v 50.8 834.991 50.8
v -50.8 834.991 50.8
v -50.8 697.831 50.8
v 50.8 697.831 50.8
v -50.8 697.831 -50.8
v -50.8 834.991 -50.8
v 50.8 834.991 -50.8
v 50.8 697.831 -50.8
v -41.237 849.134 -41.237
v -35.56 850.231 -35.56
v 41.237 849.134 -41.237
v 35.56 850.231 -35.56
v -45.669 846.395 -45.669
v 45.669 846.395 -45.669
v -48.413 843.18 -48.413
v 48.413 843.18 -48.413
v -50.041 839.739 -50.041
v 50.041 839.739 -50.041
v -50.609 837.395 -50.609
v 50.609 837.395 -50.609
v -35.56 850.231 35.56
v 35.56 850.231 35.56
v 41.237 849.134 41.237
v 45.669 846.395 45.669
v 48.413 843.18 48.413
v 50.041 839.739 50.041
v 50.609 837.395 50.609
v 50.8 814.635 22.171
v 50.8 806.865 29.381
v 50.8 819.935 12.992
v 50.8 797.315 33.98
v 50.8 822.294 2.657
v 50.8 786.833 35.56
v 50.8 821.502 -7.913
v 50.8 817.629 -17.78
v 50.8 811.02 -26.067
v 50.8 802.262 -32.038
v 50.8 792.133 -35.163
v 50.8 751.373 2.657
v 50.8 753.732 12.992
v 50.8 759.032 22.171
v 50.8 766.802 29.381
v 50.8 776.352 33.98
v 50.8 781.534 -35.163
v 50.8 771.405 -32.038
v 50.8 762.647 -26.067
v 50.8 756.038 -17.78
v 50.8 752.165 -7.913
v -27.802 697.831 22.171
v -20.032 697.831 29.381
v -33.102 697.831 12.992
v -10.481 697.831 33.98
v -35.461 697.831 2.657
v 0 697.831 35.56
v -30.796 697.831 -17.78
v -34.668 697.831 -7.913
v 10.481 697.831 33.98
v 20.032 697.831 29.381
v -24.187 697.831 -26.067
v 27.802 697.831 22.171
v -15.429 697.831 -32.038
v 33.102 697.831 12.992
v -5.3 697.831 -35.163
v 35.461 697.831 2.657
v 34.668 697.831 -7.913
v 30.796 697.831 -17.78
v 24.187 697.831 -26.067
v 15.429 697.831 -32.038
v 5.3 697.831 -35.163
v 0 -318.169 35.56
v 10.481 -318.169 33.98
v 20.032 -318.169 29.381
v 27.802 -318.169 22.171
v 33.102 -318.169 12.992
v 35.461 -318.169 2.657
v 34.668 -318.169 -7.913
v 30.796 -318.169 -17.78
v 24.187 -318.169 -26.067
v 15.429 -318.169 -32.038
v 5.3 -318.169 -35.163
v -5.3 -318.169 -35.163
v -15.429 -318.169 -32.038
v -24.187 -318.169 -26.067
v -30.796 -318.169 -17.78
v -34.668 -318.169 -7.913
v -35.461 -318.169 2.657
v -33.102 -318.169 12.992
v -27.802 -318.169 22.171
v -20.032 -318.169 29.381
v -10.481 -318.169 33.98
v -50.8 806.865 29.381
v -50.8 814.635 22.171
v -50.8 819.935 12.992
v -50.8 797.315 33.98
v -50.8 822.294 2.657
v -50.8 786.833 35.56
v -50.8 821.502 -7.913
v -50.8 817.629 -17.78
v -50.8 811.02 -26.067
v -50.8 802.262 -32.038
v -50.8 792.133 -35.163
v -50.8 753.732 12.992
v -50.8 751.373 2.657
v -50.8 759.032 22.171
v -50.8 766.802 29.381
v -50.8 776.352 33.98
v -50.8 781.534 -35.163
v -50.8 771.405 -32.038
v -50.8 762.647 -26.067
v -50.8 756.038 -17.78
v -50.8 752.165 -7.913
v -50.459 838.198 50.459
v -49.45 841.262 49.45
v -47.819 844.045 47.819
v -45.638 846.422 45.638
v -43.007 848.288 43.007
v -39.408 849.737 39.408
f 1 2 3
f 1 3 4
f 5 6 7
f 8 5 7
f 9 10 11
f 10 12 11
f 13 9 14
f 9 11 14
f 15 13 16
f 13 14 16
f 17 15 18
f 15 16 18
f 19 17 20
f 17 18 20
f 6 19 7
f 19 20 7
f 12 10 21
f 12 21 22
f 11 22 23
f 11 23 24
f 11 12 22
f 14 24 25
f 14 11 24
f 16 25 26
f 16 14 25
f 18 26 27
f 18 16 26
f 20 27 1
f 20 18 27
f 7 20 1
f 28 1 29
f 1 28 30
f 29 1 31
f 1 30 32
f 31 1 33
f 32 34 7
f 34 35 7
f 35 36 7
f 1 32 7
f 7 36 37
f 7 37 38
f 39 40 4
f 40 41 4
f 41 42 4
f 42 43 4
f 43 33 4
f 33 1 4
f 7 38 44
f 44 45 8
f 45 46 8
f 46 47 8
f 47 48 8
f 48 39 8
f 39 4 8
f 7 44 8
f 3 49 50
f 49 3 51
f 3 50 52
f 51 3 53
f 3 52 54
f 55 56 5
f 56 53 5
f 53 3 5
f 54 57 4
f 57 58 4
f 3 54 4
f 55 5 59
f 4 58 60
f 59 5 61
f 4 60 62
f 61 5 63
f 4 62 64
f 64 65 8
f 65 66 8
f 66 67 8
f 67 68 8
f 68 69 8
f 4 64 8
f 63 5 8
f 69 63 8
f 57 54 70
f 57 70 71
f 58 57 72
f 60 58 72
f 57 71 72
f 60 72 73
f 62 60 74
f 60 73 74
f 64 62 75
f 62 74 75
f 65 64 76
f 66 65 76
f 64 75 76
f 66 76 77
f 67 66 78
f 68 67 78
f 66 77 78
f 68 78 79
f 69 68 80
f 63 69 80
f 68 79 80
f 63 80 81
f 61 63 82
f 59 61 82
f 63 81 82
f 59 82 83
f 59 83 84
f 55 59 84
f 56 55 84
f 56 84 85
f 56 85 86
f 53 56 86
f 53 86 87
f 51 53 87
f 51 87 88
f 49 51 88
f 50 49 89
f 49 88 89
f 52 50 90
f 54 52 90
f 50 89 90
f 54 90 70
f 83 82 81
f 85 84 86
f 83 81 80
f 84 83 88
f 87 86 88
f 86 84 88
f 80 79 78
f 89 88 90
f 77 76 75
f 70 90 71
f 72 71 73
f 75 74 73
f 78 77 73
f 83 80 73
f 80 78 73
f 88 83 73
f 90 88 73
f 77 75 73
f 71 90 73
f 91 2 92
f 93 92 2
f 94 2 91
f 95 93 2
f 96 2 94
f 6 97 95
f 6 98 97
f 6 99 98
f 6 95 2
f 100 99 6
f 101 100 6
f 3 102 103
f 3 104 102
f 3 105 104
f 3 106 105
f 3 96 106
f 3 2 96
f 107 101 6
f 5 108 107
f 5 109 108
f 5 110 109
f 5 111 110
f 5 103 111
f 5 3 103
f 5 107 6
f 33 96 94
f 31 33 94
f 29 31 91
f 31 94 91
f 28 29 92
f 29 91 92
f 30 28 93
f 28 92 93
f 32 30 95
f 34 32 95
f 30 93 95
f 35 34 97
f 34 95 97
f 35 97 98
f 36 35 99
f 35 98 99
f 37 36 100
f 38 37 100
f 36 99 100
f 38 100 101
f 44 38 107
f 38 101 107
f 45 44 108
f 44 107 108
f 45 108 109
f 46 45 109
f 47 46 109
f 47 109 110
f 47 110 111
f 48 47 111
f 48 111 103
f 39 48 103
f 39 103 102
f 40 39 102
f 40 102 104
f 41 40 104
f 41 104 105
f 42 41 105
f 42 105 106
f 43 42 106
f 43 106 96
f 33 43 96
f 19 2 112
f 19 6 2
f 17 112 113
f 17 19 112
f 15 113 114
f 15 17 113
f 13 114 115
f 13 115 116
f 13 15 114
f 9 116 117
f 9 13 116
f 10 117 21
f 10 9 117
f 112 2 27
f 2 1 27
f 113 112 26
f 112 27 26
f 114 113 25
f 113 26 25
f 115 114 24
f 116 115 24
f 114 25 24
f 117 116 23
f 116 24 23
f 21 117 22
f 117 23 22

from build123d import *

# Parameters (mm, degrees)
SKETCH1_R           = 17.78
BOSS_EXTRUDE1_DEPTH = 508
SKETCH2_W           = 50.8
SKETCH2_H           = 50.8
BOSS_EXTRUDE2_DEPTH = 76.2
SKETCH4_R           = 17.78
CUT_EXTRUDE1_DEPTH  = 587.954376421
FILLET1_R           = 7.62
SCALE1_SCALE        = 2


with BuildPart() as part:
    # Sketch1 → Boss-Extrude1 (new body)
    with BuildSketch(Plane(origin=(0, 0, 0), x_dir=(1, 0, 0), z_dir=(0, 1, 0))):
        with Locations(Location((0, 0, 0), (0, 0, 270))):
            Circle(SKETCH1_R)
    extrude(amount=BOSS_EXTRUDE1_DEPTH)

    # Sketch2 → Boss-Extrude2 (add)
    with BuildSketch(Plane(origin=(0, 508, 0), x_dir=(1, 0, 0), z_dir=(0, 1, 0))):
        Rectangle(SKETCH2_W, SKETCH2_H)
    extrude(amount=BOSS_EXTRUDE2_DEPTH)

    # Sketch4 → Cut-Extrude1 (cut, through all)
    with BuildSketch(Plane.ZY.offset(25.4)):
        with Locations((0, 552.501368348)):
            Circle(SKETCH4_R)
    extrude(amount=-CUT_EXTRUDE1_DEPTH, mode=Mode.SUBTRACT)

    # Fillet1
    fillet1_edges = [part.edges().sort_by_distance(p)[0] for p in [
        (25.4, 584.2, 0),
        (0, 584.2, -25.4),
        (-25.4, 584.2, 0),
        (0, 584.2, 25.4),
    ]]
    fillet(fillet1_edges, radius=FILLET1_R)


with BuildPart() as part_1:
    # Scale1: scaled about (0, 318.169265299, 0)
    add(part.part.scale(SCALE1_SCALE).moved(Location((0, -318.169265299, 0))))


solid = part_1.part
